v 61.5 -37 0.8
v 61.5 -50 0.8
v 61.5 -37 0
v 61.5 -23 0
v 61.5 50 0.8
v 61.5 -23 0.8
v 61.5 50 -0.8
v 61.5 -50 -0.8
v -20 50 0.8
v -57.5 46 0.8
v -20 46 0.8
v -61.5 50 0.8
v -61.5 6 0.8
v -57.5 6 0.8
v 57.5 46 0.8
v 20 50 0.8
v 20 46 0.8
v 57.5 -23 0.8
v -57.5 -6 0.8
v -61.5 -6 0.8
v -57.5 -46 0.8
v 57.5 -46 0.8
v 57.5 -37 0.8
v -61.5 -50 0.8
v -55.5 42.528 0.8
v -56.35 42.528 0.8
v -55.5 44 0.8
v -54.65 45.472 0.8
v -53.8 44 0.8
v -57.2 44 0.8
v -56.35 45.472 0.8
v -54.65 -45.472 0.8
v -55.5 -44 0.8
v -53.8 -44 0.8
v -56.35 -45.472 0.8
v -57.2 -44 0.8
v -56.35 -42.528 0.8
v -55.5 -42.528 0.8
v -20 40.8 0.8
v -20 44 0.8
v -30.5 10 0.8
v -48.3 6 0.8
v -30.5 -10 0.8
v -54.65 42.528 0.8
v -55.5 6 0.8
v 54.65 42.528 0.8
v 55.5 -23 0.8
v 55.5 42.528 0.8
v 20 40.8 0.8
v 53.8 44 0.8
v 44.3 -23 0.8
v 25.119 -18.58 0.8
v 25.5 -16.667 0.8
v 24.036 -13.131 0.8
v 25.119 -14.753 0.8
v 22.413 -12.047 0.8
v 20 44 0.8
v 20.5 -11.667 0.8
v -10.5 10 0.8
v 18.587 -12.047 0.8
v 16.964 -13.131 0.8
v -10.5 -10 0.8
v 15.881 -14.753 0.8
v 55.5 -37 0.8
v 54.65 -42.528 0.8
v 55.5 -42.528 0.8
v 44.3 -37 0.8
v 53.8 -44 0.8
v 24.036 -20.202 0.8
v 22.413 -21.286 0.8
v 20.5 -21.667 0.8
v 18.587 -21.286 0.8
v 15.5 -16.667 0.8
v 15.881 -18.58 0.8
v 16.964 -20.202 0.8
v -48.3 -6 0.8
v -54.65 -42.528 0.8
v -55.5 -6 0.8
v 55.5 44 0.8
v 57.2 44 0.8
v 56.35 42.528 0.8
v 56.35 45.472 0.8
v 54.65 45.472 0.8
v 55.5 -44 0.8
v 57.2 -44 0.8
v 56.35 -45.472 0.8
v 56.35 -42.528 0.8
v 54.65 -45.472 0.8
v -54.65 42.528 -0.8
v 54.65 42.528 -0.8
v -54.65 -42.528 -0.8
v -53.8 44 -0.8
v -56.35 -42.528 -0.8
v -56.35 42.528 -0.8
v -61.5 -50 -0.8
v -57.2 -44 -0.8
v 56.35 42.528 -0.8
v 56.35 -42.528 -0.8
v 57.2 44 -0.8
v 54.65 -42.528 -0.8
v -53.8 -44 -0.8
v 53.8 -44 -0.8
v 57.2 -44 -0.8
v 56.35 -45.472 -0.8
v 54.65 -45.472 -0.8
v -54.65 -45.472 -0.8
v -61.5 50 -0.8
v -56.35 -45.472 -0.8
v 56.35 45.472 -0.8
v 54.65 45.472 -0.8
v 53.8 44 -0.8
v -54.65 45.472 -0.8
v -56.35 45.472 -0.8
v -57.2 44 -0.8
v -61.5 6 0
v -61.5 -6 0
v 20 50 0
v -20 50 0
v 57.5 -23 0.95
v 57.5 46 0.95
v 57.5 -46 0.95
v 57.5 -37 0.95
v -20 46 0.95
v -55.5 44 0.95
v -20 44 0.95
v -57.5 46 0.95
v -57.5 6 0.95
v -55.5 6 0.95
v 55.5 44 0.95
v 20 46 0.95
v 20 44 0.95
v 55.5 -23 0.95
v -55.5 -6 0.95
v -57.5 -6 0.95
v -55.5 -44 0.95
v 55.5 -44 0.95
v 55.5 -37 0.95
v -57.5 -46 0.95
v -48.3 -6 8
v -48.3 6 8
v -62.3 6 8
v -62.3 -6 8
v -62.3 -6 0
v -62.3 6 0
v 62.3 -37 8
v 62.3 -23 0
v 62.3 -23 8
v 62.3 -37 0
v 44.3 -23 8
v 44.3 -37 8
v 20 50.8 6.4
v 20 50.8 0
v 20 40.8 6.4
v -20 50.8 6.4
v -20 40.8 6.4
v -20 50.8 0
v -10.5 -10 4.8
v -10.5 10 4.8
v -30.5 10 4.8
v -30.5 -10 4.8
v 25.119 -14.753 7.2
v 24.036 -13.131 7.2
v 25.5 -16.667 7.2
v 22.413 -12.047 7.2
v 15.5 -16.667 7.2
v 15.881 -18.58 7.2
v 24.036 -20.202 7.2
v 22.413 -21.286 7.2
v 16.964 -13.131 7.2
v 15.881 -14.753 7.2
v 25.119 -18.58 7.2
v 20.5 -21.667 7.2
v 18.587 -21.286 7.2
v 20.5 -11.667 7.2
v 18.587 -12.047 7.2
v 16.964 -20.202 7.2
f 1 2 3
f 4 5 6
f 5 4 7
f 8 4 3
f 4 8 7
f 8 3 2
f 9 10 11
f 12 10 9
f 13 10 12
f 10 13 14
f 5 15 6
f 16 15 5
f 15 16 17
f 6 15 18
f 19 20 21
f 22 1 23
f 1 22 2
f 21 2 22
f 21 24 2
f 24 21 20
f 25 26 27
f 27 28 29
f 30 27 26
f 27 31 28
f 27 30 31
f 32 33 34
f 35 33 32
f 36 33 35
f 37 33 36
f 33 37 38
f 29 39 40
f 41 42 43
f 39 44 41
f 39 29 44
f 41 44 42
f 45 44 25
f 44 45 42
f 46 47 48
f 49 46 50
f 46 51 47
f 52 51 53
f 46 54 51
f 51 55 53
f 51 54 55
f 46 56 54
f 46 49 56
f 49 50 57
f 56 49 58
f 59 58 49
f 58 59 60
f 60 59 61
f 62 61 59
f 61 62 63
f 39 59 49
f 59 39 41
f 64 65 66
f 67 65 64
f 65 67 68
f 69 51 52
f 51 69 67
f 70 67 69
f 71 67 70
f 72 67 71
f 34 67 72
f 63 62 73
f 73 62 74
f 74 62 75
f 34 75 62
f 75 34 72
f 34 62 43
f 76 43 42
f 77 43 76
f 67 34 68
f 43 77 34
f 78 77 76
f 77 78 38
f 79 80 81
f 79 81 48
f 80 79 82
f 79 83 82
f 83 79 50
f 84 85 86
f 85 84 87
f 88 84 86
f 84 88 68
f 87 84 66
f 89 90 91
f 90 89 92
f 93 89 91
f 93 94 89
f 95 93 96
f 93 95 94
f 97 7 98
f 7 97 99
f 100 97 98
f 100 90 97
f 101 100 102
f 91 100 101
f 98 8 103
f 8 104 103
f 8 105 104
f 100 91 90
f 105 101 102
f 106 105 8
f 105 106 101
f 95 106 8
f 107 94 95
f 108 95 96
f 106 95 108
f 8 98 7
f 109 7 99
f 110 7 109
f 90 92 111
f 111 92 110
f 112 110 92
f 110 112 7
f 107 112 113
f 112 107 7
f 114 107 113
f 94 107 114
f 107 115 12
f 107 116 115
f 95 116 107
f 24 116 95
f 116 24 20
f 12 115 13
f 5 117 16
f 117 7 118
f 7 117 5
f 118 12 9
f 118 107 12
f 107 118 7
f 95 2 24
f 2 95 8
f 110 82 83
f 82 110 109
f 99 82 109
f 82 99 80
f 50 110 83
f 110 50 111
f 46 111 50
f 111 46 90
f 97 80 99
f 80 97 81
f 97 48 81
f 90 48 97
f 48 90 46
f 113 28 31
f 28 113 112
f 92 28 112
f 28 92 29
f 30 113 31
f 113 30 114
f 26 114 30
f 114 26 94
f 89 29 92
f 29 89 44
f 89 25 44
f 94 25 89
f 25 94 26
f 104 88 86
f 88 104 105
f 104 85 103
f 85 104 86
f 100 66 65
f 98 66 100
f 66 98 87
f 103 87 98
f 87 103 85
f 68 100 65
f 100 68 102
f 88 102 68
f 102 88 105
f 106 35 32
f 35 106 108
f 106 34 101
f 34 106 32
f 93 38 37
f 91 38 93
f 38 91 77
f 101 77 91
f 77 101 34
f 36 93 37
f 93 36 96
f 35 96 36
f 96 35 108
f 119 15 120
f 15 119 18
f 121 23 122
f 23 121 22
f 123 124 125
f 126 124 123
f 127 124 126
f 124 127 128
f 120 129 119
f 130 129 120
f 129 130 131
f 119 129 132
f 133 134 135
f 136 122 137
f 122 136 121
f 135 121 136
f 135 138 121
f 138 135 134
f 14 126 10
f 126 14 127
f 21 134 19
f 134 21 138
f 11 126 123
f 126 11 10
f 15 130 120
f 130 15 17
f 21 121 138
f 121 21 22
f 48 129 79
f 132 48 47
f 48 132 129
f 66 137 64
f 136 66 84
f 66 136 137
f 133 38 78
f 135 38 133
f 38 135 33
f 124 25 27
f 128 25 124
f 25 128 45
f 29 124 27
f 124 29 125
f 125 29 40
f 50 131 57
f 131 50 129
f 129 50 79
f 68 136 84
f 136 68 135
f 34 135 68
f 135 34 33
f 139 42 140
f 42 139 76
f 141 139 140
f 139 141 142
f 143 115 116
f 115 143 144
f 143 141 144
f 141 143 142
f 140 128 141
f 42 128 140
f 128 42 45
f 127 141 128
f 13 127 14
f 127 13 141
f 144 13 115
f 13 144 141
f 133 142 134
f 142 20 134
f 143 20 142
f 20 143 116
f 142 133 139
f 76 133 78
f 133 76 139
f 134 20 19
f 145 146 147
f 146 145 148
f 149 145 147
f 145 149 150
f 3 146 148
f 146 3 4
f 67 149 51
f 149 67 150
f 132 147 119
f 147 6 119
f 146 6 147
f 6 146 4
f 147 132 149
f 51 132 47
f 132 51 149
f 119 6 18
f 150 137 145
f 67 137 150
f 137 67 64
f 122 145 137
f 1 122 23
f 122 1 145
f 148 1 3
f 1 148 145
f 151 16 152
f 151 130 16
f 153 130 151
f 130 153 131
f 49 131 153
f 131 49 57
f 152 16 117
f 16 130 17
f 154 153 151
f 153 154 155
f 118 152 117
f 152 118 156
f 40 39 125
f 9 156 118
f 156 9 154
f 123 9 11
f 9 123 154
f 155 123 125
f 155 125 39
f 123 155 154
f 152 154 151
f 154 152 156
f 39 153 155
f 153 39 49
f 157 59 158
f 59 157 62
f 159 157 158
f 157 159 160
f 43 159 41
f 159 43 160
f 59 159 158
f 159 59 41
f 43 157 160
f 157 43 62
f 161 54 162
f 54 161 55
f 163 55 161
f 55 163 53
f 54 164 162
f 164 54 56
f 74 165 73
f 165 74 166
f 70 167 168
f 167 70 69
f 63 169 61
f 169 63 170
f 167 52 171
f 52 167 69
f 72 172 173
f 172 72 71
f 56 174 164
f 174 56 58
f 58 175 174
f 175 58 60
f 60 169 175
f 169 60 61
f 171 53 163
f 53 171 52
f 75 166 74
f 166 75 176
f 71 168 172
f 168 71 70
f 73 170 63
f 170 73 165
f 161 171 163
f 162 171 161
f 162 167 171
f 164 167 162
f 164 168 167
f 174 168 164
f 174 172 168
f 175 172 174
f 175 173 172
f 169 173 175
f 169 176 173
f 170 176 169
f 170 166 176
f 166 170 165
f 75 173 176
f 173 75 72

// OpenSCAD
// Parameters
pcb_length = 123.0; //[60.0:246.0:1]
pcb_width = 100.0; //[50.0:200.0:1]
pcb_thickness = 1.6; //[0.8:3.2:0.1]
corner_fillet_radius = 6.0; //[2.0:12.0:0.5]
mount_hole_diameter = 3.2; //[2.0:6.0:0.1]
mount_hole_edge_offset_x = 6.0; //[3.0:15.0:0.5]
mount_hole_edge_offset_y = 6.0; //[3.0:15.0:0.5]
hole_clearance_extra = 0.2; //[0.0:0.6:0.05]
hole_cut_height_extra = 2.0; //[0.5:5.0:0.5]
silkscreen_height = 0.15; //[0.05:0.4:0.05]
silkscreen_margin = 4.0; //[1.0:10.0:0.5]
component_base_height = 8.0; //[3.0:20.0:1]
component_overlap = 0.8; //[0.5:2.0:0.1]

// Main PCB Body with Corner Fillets
module pcb_with_corner_fillets() {
  color([0.0, 0.4, 0.2]) // PCB green
  union() {
    translate([0, 0, 0])
      cube([pcb_length, pcb_width, pcb_thickness], center=true);
    translate([pcb_length/2 - corner_fillet_radius, pcb_width/2 - corner_fillet_radius, 0])
      cylinder(r=corner_fillet_radius, h=pcb_thickness, center=true);
    translate([-pcb_length/2 + corner_fillet_radius, pcb_width/2 - corner_fillet_radius, 0])
      cylinder(r=corner_fillet_radius, h=pcb_thickness, center=true);
    translate([pcb_length/2 - corner_fillet_radius, -pcb_width/2 + corner_fillet_radius, 0])
      cylinder(r=corner_fillet_radius, h=pcb_thickness, center=true);
    translate([-pcb_length/2 + corner_fillet_radius, -pcb_width/2 + corner_fillet_radius, 0])
      cylinder(r=corner_fillet_radius, h=pcb_thickness, center=true);
  }
}

// Mounting Holes
module mounting_holes() {
  union() {
    translate([pcb_length/2 - mount_hole_edge_offset_x, pcb_width/2 - mount_hole_edge_offset_y, 0])
      cylinder(r=(mount_hole_diameter + hole_clearance_extra)/2, h=pcb_thickness + hole_cut_height_extra, center=true);
    translate([-pcb_length/2 + mount_hole_edge_offset_x, pcb_width/2 - mount_hole_edge_offset_y, 0])
      cylinder(r=(mount_hole_diameter + hole_clearance_extra)/2, h=pcb_thickness + hole_cut_height_extra, center=true);
    translate([pcb_length/2 - mount_hole_edge_offset_x, -pcb_width/2 + mount_hole_edge_offset_y, 0])
      cylinder(r=(mount_hole_diameter + hole_clearance_extra)/2, h=pcb_thickness + hole_cut_height_extra, center=true);
    translate([-pcb_length/2 + mount_hole_edge_offset_x, -pcb_width/2 + mount_hole_edge_offset_y, 0])
      cylinder(r=(mount_hole_diameter + hole_clearance_extra)/2, h=pcb_thickness + hole_cut_height_extra, center=true);
  }
}

// Silkscreen Markings
module silkscreen_markings() {
  color([0.85, 0.85, 0.8]) // Off-white for silkscreen
  difference() {
    translate([0, 0, pcb_thickness/2 + silkscreen_height/2])
      cube([pcb_length - 2*silkscreen_margin, pcb_width - 2*silkscreen_margin, silkscreen_height], center=true);
    translate([0, 0, pcb_thickness/2 + silkscreen_height/2])
      cube([pcb_length - 2*(silkscreen_margin + 2), pcb_width - 2*(silkscreen_margin + 2), silkscreen_height + 1], center=true);
  }
}

// Connectors and Components
module connectors_and_components() {
  color([0.1, 0.1, 0.12]) // Black for components
  union() {
    translate([-pcb_length/2 + 14/2 - component_overlap, 0, pcb_thickness/2 + component_base_height/2 - component_overlap])
      cube([14, 12, component_base_height], center=true);
    translate([pcb_length/2 - 18/2 + component_overlap, -pcb_width/2 + 20, pcb_thickness/2 + component_base_height/2 - component_overlap])
      cube([18, 14, component_base_height], center=true);
    translate([0, pcb_width/2 - 10/2 + component_overlap, pcb_thickness/2 + (component_base_height*0.8)/2 - component_overlap])
      cube([40, 10, component_base_height*0.8], center=true);
    translate([-pcb_length/6, 0, pcb_thickness/2 + (component_base_height*0.6)/2 - component_overlap])
      cube([20, 20, component_base_height*0.6], center=true);
    translate([pcb_length/6, -pcb_width/6, pcb_thickness/2 + (component_base_height*0.9)/2 - component_overlap])
      cylinder(r=5, h=component_base_height*0.9, center=true);
  }
}

// Complete PCB Model
difference() {
  pcb_with_corner_fillets();
  mounting_holes();
}
union() {
  silkscreen_markings();
  connectors_and_components();
}
